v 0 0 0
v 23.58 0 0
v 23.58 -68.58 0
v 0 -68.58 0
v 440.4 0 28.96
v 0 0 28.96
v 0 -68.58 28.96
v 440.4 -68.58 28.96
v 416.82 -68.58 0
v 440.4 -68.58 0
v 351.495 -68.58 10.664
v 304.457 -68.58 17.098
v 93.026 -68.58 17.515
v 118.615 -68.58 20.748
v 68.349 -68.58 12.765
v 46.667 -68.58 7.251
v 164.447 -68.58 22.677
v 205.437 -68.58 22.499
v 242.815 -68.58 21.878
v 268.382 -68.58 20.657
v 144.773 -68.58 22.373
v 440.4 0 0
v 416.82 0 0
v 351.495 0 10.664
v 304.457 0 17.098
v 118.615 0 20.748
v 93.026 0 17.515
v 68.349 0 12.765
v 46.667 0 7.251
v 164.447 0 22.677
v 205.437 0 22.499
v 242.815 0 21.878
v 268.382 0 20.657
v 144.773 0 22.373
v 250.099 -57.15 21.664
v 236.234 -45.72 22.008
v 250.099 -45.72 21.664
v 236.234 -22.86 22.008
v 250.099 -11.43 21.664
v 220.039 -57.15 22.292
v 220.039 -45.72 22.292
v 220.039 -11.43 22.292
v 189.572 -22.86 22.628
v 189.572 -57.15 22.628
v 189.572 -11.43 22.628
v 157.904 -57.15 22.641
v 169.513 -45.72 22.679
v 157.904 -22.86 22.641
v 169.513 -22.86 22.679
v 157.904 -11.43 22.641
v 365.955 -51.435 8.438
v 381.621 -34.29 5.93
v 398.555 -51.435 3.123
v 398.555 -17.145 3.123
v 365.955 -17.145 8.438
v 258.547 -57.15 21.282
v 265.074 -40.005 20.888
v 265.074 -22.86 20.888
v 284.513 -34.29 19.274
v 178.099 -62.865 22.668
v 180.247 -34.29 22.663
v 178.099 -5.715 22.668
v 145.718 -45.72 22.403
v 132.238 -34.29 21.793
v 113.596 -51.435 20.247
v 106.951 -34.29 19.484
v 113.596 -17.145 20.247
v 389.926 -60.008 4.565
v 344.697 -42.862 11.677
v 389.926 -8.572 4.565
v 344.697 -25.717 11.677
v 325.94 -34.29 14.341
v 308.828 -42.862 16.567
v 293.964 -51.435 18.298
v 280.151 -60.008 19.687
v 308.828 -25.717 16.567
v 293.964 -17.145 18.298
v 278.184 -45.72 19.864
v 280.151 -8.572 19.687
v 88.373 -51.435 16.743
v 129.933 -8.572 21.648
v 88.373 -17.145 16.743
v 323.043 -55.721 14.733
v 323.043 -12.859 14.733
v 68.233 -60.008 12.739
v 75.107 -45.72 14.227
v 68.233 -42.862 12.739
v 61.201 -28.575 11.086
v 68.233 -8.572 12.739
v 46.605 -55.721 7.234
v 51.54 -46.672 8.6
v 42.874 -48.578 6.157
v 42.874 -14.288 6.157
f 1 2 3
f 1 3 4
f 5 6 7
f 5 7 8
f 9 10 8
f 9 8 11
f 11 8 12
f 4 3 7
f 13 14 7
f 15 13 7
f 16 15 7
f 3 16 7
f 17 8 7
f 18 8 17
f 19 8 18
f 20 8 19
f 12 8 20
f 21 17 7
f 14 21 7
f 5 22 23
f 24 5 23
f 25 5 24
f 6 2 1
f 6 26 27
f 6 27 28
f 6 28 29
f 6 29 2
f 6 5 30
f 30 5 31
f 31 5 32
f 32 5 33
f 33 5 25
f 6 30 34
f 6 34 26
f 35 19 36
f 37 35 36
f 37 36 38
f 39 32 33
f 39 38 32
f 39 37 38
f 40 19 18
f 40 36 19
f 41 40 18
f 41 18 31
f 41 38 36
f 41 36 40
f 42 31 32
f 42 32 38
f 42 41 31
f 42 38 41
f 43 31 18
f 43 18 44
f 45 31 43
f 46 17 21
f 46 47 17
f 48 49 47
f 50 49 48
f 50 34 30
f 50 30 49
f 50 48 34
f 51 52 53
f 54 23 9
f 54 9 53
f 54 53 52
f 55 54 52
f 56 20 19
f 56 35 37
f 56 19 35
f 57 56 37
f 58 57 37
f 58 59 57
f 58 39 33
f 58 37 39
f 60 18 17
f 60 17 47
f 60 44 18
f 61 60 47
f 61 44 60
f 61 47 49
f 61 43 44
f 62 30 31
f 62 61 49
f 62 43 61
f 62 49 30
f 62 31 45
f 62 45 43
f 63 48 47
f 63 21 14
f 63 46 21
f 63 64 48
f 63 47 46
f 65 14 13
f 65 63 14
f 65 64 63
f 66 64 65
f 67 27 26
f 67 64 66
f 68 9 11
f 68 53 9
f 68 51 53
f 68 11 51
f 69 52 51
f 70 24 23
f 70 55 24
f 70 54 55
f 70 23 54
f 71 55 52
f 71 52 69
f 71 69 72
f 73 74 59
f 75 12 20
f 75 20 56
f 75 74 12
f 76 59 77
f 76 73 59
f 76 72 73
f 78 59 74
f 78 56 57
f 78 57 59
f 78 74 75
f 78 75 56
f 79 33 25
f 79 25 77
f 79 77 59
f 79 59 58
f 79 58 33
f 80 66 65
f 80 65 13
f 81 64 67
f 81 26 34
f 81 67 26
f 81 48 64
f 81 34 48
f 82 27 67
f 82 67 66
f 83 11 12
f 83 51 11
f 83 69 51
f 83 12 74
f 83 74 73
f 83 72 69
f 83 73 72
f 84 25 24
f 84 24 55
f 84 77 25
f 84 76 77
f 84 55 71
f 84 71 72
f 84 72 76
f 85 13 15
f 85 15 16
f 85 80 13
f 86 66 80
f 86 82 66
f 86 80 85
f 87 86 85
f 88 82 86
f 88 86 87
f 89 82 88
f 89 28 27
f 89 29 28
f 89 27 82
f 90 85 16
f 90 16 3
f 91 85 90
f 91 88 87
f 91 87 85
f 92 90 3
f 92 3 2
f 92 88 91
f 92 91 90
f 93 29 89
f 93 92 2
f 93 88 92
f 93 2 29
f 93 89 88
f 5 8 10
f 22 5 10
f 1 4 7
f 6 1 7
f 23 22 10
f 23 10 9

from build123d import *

# Parameters (mm, degrees)
BAR_DEPTH = 68.58


with BuildPart() as part:
    # Sketch → Bar (new body)
    with BuildSketch(Plane.XZ):
        with BuildLine():
            Line((23.58, 0), (0, 0))
            Line((0, 0), (0, 28.96))
            Line((0, 28.96), (440.4, 28.96))
            Line((440.4, 28.96), (440.4, 0))
            Line((440.4, 0), (416.82, 0))
            add(Edge.make_bspline(
                [(416.82, 0), (296.03, 20.95), (224.26, 22.21), (188.45, 22.89), (88.83, 22.5), (23.58, 0)],
                knots=[0, 0, 0, 0, 0.333333, 0.666667, 1, 1, 1, 1], degree=3))
        make_face()
    extrude(amount=BAR_DEPTH)


solid = part.part
